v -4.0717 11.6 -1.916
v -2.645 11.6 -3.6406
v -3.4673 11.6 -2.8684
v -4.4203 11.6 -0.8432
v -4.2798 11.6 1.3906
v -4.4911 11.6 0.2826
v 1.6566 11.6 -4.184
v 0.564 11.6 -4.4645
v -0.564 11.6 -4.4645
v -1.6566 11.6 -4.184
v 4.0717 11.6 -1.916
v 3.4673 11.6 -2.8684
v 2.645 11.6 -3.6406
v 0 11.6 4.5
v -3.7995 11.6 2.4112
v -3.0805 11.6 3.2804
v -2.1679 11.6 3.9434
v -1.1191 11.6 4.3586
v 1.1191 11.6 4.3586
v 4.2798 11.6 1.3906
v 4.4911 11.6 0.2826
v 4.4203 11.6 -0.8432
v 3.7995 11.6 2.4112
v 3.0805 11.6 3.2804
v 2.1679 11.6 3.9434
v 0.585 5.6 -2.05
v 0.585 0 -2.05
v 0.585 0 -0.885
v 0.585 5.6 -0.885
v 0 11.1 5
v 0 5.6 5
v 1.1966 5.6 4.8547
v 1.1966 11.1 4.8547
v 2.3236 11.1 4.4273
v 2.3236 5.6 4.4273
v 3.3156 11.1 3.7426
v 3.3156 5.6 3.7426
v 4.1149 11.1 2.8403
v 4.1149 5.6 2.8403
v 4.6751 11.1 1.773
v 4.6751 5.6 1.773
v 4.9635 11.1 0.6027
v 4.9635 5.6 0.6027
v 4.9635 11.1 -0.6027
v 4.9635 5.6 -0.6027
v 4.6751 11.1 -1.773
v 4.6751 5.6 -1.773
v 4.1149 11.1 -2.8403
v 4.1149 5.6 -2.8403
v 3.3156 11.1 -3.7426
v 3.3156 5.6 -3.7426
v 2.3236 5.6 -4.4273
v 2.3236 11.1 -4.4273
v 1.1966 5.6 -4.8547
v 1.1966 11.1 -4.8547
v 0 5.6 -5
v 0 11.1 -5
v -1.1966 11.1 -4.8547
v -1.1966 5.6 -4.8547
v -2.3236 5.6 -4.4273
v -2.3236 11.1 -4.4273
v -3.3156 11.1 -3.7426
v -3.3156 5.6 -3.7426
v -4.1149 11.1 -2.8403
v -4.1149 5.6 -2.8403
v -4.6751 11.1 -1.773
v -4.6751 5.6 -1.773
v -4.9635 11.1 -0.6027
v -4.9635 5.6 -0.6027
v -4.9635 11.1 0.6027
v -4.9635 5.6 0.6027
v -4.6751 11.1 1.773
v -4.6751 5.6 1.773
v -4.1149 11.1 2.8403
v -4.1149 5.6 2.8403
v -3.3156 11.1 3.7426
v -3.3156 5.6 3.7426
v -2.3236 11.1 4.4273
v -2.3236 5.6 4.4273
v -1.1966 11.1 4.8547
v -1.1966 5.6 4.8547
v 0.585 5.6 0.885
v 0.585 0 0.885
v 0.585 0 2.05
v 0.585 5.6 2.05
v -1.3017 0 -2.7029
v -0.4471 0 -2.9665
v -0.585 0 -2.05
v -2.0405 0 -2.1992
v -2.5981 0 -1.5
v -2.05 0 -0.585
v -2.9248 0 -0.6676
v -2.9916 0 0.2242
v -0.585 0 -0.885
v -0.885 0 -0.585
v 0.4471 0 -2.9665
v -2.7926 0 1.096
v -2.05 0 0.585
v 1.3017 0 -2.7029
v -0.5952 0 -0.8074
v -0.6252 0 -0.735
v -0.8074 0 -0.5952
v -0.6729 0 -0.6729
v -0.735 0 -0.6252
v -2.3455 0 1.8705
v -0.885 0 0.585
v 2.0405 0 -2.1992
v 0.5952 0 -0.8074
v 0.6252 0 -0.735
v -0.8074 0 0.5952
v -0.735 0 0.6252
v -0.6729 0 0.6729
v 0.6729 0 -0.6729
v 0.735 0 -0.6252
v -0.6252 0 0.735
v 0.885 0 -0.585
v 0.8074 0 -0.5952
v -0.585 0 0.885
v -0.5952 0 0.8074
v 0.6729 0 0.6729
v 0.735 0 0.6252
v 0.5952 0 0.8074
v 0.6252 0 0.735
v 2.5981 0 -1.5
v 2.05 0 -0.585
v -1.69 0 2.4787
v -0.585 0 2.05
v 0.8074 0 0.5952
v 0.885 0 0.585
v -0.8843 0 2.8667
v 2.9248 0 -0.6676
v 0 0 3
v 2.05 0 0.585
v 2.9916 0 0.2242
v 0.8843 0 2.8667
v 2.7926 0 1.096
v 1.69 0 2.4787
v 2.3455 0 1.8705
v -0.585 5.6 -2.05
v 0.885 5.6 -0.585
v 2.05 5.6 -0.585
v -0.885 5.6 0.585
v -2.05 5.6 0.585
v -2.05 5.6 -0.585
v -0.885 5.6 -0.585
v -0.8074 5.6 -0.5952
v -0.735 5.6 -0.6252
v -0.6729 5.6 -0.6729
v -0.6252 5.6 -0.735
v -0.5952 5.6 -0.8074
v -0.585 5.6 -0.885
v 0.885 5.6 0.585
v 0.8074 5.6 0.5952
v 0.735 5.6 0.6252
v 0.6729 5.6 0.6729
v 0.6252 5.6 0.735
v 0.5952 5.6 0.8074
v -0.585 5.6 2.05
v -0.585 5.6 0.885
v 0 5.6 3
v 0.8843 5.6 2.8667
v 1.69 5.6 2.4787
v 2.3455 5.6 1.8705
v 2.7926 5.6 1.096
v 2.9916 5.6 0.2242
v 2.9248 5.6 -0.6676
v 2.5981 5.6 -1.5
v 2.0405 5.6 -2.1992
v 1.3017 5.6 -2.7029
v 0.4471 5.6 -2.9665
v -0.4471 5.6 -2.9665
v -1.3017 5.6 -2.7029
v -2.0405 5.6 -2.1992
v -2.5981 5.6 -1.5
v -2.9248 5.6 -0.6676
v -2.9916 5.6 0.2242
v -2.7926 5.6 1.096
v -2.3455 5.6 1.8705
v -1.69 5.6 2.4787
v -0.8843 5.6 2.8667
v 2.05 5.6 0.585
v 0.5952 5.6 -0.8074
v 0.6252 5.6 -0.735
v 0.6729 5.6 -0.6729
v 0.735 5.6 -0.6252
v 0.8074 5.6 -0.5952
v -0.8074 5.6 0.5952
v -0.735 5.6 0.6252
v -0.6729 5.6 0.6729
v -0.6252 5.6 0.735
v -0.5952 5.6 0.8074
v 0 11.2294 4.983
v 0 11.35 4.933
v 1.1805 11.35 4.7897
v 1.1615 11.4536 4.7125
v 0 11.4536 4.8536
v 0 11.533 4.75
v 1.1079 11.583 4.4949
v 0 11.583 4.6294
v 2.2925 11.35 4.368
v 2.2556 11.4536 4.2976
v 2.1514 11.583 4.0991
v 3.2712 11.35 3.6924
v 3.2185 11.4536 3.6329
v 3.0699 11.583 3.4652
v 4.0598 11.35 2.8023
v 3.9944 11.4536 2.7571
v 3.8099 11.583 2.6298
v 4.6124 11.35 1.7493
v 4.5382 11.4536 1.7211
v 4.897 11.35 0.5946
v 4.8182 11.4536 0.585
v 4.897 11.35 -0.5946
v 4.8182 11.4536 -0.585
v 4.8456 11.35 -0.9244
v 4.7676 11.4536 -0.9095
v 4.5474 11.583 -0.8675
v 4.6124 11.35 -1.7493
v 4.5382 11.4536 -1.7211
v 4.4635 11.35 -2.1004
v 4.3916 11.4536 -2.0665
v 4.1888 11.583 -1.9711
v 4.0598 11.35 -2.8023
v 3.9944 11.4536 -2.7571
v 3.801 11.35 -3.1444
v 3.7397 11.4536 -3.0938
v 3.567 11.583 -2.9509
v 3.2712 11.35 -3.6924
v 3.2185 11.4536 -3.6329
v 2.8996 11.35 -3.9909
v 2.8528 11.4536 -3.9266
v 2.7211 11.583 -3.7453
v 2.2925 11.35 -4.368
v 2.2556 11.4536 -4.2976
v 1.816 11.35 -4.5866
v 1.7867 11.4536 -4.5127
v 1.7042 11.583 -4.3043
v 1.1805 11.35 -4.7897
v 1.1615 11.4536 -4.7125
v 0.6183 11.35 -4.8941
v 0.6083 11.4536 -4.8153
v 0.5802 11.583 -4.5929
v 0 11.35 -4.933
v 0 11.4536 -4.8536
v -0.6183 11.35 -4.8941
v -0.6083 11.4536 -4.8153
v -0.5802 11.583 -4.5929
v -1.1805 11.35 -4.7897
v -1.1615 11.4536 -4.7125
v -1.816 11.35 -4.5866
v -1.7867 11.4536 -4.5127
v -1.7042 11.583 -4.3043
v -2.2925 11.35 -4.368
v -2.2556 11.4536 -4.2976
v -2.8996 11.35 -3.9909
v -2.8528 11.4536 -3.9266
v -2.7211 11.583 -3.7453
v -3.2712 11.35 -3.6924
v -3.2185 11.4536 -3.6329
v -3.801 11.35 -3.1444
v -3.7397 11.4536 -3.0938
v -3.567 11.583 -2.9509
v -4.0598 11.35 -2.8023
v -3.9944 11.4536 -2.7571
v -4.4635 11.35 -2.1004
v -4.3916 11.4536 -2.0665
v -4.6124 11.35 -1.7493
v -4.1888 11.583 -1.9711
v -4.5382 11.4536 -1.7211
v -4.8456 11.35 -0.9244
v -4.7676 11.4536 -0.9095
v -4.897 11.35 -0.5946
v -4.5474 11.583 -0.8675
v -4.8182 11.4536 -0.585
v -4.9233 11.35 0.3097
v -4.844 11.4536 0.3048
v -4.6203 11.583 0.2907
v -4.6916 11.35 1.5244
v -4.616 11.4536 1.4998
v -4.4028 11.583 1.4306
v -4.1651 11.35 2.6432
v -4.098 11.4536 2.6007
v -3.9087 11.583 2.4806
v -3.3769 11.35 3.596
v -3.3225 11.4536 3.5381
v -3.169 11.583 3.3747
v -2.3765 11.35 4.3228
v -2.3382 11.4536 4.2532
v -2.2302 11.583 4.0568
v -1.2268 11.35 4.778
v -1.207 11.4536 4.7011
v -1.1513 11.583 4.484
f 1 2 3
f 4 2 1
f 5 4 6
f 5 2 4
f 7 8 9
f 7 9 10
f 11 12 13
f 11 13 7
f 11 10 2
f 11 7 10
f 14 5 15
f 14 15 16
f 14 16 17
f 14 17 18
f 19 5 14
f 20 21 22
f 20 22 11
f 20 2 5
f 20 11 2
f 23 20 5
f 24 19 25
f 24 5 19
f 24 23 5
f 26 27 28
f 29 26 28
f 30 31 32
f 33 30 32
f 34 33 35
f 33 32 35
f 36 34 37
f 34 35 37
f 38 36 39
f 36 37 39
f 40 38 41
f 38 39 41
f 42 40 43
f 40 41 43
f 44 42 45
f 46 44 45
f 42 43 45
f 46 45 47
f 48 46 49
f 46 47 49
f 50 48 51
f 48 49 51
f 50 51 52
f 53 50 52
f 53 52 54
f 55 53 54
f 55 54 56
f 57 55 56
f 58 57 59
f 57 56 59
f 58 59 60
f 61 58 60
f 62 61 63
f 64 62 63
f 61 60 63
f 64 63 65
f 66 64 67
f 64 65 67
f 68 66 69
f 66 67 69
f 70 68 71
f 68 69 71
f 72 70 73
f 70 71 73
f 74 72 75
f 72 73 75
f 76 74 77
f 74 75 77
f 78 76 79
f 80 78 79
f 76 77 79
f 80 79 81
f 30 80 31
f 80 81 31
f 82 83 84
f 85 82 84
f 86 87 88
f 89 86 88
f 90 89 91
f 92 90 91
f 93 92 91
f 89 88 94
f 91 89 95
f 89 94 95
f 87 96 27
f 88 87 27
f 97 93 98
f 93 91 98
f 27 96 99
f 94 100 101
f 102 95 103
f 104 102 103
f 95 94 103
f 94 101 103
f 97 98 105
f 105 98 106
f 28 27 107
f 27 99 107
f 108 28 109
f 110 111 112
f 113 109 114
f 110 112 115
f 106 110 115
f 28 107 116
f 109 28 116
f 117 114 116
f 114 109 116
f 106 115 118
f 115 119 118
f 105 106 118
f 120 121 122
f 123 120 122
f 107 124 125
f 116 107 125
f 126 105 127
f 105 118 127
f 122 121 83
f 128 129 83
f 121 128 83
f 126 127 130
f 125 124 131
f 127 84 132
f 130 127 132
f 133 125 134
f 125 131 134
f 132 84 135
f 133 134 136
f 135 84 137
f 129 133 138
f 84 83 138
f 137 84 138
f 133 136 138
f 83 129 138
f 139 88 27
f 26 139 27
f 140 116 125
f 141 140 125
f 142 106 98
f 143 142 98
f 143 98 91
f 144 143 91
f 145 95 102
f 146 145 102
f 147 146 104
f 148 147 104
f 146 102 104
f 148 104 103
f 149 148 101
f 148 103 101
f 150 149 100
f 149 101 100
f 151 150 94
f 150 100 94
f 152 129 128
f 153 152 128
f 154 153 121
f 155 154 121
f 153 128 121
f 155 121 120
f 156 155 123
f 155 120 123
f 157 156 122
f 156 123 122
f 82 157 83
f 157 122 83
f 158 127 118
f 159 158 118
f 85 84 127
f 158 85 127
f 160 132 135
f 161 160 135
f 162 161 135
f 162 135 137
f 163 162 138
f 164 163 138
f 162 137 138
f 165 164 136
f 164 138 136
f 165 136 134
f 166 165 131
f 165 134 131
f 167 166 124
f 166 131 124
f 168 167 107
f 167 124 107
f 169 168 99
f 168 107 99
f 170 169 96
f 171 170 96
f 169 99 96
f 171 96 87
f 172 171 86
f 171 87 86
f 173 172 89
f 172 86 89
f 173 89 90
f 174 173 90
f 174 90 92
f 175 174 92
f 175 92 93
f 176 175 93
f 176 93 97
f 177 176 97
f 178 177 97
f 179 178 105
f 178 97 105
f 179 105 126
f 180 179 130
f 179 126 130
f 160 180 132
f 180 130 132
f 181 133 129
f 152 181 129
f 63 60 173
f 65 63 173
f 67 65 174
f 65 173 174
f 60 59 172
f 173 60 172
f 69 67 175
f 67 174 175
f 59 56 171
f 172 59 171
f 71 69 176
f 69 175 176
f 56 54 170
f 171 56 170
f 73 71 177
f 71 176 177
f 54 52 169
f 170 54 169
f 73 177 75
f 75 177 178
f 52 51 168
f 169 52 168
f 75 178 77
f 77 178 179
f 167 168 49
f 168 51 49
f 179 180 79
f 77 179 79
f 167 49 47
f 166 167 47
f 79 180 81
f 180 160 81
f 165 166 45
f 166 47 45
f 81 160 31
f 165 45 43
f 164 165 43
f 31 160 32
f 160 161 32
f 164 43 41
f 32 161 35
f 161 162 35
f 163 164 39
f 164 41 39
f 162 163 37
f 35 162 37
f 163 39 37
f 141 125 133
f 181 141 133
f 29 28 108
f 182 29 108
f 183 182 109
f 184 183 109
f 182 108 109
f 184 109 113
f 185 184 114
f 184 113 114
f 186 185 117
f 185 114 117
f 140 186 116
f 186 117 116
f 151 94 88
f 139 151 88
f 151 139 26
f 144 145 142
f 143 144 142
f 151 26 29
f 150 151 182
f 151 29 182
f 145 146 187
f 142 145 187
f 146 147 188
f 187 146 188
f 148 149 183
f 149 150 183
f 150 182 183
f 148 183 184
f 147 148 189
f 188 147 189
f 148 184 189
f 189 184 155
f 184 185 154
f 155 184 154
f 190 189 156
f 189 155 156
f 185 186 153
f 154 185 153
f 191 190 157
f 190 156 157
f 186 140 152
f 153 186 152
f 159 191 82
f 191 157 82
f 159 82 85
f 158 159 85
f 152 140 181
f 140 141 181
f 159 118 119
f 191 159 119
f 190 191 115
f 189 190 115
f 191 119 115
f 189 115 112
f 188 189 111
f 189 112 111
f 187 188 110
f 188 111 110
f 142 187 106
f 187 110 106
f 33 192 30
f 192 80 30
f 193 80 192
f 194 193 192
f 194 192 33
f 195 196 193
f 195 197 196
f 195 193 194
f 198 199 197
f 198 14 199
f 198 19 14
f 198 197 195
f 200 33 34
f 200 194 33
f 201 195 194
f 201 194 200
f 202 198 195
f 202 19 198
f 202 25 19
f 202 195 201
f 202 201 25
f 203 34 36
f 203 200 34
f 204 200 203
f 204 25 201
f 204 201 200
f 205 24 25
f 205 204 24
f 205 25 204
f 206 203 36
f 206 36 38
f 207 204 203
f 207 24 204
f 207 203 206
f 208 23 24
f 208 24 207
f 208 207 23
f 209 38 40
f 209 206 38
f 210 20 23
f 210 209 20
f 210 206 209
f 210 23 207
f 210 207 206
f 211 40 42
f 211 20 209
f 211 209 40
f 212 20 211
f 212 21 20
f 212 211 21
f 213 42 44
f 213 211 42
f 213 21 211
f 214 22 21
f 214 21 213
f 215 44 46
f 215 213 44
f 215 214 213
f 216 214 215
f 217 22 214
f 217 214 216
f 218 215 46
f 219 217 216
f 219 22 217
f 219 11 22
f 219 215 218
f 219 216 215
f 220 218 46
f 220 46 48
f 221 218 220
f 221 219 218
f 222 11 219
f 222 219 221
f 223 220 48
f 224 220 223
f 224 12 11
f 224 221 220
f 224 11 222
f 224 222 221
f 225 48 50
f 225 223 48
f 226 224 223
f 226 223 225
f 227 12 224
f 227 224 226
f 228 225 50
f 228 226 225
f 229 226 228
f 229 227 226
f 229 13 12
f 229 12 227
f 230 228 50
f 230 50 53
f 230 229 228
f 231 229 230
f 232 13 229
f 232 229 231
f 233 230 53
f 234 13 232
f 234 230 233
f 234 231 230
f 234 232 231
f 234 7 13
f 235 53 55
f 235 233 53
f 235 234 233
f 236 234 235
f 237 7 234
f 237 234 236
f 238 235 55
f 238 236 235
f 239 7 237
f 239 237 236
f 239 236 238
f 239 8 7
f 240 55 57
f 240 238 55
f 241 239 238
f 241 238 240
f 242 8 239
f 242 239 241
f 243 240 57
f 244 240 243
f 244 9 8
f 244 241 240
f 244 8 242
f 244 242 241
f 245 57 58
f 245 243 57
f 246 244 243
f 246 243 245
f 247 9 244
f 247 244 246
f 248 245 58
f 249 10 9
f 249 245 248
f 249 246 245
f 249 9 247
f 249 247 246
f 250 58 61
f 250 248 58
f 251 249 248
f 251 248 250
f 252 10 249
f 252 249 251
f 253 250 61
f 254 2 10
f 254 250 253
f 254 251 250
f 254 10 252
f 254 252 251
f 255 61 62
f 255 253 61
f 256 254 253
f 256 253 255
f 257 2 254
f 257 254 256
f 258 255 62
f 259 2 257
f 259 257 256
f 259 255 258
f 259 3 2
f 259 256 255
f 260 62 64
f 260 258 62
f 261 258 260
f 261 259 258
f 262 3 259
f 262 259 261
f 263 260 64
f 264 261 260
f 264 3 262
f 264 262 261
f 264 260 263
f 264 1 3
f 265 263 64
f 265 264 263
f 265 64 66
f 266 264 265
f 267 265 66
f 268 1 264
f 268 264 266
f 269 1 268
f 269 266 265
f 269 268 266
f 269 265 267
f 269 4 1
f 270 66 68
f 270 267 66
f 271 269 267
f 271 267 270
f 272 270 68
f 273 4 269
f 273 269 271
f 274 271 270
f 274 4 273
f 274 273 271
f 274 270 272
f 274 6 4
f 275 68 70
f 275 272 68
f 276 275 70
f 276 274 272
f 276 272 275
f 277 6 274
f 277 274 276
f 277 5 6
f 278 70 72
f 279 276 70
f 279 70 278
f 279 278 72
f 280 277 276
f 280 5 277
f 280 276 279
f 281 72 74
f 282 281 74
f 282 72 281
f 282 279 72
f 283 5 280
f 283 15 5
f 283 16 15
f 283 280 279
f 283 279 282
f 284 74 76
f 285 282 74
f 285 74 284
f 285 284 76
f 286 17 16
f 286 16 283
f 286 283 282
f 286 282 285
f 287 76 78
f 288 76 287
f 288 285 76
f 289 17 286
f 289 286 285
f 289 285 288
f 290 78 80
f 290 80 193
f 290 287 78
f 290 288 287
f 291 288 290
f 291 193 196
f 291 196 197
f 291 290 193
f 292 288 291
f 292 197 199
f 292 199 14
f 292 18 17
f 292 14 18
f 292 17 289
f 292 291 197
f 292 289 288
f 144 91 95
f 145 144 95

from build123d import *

# Parameters (mm, degrees)
SKETCH1_R          = 3
STEM_HOUSING_DEPTH = 5.6
SKETCH2_R          = 5
BUTTON_HEAD_DEPTH  = 6
FILLET1_R          = 0.5


with BuildPart() as part:
    # Sketch1 → stem housing (new body)
    with BuildSketch(Plane(origin=(0, 0, 0), x_dir=(1, 0, 0), z_dir=(0, 1, 0))):
        with Locations(Location((0, 0, 0), (0, 0, 270))):
            Circle(SKETCH1_R)
        with BuildLine():
            Line((-0.585, 0.885), (-0.585, 2.05))
            Line((-0.585, 2.05), (0.585, 2.05))
            Line((0.585, 2.05), (0.585, 0.885))
            ThreePointArc((0.585, 0.885), (0.672867966, 0.672867966), (0.885, 0.585))
            Line((0.885, 0.585), (2.05, 0.585))
            Line((2.05, 0.585), (2.05, -0.585))
            Line((2.05, -0.585), (0.885, -0.585))
            ThreePointArc((0.885, -0.585), (0.672867966, -0.672867966), (0.585, -0.885))
            Line((0.585, -0.885), (0.585, -2.05))
            Line((0.585, -2.05), (-0.585, -2.05))
            Line((-0.585, -2.05), (-0.585, -0.885))
            ThreePointArc((-0.585, -0.885), (-0.672867966, -0.672867966), (-0.885, -0.585))
            Line((-0.885, -0.585), (-2.05, -0.585))
            Line((-2.05, -0.585), (-2.05, 0.585))
            Line((-2.05, 0.585), (-0.885, 0.585))
            ThreePointArc((-0.885, 0.585), (-0.672867966, 0.672867966), (-0.585, 0.885))
        make_face(mode=Mode.SUBTRACT)
    extrude(amount=STEM_HOUSING_DEPTH)

    # Sketch2 → button head (add)
    with BuildSketch(Plane(origin=(0, 5.6, 0), x_dir=(1, 0, 0), z_dir=(0, 1, 0))):
        with Locations(Location((0, 0, 0), (0, 0, 270))):
            Circle(SKETCH2_R)
    extrude(amount=BUTTON_HEAD_DEPTH)

    # Fillet1
    fillet1_edges = [part.edges().sort_by_distance(p)[0] for p in [
        (0, 11.6, -5),
    ]]
    fillet(fillet1_edges, radius=FILLET1_R)


solid = part.part
